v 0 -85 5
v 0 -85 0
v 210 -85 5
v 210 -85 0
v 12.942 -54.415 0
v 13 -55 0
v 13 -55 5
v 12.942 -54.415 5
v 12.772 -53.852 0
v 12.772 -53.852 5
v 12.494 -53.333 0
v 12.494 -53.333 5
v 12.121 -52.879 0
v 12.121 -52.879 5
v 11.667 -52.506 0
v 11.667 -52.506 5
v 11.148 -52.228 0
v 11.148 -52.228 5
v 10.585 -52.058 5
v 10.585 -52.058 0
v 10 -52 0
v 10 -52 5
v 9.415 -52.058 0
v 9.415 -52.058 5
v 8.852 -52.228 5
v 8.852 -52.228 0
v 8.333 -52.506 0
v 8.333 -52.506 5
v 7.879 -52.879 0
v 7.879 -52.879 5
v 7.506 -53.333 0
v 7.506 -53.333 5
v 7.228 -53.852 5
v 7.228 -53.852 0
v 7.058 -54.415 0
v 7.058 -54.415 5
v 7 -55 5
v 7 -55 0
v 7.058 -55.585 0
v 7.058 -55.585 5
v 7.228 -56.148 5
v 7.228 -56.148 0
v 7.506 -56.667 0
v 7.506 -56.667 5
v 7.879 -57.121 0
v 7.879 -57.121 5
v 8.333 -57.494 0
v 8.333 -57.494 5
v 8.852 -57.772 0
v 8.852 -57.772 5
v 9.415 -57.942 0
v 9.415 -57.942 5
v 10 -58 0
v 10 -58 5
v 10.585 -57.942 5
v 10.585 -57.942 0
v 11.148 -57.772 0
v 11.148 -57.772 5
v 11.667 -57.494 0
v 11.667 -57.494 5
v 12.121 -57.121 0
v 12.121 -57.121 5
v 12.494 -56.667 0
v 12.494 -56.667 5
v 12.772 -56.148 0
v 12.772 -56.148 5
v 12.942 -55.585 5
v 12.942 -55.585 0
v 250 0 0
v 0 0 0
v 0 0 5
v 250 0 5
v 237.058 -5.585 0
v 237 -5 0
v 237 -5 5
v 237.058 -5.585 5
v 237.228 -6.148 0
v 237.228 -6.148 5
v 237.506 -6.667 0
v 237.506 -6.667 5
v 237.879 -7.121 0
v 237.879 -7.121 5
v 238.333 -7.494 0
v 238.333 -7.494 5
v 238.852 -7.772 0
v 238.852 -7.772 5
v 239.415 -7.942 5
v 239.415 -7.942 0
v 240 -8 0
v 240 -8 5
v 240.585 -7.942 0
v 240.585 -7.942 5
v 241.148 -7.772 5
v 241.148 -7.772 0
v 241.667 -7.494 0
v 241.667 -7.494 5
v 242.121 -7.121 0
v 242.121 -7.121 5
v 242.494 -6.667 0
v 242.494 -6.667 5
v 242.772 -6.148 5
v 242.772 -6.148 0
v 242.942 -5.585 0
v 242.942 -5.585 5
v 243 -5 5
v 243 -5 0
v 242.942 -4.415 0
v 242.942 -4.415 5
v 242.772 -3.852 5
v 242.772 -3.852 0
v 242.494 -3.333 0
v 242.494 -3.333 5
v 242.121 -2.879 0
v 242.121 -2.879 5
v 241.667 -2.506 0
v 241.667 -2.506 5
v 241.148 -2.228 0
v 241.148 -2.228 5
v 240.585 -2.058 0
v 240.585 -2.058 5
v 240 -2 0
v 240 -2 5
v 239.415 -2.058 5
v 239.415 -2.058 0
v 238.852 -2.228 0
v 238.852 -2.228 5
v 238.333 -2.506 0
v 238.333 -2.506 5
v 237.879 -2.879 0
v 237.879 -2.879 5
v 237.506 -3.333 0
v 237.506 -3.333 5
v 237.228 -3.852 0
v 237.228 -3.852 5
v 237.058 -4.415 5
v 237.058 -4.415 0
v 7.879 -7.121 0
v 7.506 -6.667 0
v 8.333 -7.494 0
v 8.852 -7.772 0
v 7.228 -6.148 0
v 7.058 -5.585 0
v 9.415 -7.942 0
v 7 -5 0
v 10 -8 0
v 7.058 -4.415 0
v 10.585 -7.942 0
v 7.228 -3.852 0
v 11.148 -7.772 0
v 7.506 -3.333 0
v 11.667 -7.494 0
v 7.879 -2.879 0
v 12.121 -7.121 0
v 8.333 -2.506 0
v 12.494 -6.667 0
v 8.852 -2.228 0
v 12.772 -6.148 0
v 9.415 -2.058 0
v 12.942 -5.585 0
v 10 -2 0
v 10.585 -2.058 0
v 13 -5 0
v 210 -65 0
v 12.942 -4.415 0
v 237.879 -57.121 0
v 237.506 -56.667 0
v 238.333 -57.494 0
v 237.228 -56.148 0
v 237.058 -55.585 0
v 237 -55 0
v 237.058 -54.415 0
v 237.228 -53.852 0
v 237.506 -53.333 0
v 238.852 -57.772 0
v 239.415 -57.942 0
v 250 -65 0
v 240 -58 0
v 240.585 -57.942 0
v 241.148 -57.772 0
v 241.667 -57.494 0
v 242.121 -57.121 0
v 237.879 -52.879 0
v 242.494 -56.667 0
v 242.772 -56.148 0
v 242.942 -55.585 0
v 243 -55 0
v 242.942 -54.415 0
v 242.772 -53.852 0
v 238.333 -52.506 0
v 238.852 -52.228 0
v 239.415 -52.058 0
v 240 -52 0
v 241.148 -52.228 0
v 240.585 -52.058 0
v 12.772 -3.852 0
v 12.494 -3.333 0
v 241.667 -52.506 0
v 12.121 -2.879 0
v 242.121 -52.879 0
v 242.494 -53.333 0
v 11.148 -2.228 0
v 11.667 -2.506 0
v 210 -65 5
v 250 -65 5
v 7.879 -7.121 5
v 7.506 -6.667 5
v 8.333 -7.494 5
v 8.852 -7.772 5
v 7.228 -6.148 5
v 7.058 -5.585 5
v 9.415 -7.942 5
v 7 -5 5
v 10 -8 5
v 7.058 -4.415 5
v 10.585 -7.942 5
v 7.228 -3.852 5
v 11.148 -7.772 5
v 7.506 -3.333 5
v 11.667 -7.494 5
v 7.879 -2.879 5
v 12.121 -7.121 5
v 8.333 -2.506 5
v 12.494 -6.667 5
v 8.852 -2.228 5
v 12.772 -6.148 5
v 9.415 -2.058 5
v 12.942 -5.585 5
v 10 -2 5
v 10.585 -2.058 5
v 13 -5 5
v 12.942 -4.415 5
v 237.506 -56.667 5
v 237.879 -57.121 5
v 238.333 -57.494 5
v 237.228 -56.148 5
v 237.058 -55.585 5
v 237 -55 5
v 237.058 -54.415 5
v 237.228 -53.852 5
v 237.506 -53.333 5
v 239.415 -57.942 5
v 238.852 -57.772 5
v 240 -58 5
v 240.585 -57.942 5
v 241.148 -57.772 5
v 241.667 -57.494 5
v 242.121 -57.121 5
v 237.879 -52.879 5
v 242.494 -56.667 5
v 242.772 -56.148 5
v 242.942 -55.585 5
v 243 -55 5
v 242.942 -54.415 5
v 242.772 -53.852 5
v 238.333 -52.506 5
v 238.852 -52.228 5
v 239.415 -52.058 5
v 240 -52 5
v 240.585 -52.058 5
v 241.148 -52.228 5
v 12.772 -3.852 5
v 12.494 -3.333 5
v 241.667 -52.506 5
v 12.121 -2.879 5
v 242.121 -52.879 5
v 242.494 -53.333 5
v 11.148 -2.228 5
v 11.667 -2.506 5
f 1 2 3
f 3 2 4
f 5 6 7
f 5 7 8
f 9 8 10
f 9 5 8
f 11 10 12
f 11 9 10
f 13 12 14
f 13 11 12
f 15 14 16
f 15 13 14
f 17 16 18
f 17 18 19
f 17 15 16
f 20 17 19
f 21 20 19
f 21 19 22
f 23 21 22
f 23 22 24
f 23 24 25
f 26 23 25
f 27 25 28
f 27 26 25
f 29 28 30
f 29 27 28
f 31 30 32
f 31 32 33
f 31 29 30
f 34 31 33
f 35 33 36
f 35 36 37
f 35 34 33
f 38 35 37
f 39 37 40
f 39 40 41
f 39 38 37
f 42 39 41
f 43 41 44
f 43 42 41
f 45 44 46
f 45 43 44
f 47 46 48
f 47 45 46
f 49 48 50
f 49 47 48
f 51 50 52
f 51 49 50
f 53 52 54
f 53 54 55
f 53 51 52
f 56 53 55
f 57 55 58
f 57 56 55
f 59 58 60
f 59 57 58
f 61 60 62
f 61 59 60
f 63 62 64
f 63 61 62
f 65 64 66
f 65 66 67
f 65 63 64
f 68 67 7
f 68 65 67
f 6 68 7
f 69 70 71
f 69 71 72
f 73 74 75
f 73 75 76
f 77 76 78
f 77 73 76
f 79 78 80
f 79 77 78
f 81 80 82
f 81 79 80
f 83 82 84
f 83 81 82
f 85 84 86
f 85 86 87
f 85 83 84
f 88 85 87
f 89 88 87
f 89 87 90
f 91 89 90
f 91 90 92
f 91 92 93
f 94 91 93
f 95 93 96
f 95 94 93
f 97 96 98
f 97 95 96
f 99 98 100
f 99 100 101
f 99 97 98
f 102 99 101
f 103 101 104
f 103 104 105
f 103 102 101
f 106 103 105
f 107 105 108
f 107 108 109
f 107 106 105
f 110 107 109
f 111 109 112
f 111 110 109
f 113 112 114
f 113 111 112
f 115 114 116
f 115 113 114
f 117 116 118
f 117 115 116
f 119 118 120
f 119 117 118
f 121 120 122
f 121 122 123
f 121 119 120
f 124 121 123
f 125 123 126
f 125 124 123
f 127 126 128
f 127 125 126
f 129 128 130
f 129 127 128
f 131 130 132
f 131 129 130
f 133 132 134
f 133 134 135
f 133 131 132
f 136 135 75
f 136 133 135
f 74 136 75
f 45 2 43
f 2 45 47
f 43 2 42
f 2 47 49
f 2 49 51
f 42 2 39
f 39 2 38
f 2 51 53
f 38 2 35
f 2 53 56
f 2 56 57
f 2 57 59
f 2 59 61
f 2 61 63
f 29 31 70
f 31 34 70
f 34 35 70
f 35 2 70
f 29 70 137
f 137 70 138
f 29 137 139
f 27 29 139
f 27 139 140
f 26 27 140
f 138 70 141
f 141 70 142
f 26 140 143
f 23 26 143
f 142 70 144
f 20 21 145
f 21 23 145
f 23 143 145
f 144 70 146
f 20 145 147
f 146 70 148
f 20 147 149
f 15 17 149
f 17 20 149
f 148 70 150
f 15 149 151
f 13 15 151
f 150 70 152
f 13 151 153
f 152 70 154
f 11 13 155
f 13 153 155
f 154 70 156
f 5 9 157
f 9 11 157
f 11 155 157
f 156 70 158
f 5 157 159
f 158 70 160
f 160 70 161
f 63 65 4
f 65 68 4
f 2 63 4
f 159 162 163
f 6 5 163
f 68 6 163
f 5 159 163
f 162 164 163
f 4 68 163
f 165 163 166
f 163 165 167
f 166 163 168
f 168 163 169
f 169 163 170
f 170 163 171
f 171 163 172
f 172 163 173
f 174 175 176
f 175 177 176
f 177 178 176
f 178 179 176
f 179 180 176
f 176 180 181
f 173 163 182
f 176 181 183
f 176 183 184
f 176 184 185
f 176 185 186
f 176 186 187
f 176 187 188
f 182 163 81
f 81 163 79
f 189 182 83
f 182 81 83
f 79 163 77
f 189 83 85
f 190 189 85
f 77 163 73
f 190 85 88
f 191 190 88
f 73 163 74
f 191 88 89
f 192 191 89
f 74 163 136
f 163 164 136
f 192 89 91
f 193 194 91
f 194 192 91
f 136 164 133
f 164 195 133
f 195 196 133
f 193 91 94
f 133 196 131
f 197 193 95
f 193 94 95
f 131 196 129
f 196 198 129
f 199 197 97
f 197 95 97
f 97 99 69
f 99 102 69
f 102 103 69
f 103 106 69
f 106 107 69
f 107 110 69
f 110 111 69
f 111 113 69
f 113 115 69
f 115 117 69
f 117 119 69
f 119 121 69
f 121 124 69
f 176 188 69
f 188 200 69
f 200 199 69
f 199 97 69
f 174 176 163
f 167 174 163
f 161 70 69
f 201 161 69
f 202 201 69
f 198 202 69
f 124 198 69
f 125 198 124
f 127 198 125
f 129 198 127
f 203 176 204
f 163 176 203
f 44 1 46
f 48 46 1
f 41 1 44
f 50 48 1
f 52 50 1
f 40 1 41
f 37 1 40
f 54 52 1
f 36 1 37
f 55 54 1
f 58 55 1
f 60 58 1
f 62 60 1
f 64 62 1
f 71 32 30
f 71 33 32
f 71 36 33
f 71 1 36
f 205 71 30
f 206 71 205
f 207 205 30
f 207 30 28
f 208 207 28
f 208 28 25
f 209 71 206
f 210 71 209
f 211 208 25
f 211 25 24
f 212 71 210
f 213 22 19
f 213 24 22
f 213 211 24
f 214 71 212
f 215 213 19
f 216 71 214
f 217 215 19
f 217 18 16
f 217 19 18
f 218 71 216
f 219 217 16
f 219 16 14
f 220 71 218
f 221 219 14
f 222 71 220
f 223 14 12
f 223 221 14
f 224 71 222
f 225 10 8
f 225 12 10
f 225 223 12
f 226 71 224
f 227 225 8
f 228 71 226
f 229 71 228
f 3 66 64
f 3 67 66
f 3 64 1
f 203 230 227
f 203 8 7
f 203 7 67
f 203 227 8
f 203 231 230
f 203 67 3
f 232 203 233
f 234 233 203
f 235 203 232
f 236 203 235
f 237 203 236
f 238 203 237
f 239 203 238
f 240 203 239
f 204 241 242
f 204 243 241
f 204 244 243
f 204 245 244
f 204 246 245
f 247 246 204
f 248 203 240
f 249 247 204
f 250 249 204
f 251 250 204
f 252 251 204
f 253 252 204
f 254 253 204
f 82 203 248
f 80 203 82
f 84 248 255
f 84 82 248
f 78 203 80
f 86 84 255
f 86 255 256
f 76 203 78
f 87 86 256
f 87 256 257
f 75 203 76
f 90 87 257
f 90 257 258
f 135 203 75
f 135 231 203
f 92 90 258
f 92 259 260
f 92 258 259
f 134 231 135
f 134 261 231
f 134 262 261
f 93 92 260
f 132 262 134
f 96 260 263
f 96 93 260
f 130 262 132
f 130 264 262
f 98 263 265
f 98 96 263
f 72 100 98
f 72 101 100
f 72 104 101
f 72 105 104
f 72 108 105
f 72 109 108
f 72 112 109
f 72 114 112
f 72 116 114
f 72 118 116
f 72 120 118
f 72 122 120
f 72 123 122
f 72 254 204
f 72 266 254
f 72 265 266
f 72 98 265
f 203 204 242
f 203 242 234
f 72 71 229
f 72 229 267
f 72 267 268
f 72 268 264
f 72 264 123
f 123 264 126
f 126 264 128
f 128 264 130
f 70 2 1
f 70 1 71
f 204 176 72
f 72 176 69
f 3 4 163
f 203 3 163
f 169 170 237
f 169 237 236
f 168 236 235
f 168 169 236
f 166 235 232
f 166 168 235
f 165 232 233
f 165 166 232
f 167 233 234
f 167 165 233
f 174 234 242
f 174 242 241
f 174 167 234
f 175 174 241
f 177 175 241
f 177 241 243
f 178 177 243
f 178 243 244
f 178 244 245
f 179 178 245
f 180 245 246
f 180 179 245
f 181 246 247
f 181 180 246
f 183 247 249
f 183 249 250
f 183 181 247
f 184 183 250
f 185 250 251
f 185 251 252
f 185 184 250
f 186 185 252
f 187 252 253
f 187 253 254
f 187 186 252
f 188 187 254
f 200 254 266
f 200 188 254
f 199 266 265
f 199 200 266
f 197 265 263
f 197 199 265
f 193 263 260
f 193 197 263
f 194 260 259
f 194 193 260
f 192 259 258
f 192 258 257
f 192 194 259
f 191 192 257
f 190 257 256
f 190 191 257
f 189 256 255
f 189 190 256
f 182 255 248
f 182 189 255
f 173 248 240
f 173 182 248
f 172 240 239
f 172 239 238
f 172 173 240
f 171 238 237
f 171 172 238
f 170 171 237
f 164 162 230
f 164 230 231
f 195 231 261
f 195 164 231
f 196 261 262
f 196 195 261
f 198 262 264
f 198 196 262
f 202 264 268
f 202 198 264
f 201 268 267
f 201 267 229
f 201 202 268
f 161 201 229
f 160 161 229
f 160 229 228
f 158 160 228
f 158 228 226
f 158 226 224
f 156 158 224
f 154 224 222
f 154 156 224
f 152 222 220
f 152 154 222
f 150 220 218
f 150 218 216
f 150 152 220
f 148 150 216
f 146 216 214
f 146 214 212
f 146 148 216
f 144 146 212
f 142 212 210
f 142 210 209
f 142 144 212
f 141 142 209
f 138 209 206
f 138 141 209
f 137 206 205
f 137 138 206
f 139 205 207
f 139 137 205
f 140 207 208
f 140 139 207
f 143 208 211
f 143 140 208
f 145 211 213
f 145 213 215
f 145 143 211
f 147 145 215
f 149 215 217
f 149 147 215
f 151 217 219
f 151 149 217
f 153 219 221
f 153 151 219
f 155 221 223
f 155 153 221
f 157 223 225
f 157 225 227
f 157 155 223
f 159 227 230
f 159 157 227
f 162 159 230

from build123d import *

# Parameters (mm, degrees)
ESQUISSE1_W             = 250
ESQUISSE1_H             = 85
ESQUISSE1_R             = 3
BOSS_EXTRU_1_DEPTH      = 5
ESQUISSE2_W             = 40
ESQUISSE2_H             = 20
ENL_V_MAT_EXTRU_1_DEPTH = 10


with BuildPart() as part:
    # Esquisse1 → Boss.-Extru.1 (new body)
    with BuildSketch(Plane.XY):
        with Locations((125, -42.5)):
            Rectangle(ESQUISSE1_W, ESQUISSE1_H)
        with Locations((10, -5)):
            Circle(ESQUISSE1_R, mode=Mode.SUBTRACT)
        with Locations((10, -55)):
            Circle(ESQUISSE1_R, mode=Mode.SUBTRACT)
        with Locations(Location((240, -55, 0), (0, 0, 180))):
            Circle(ESQUISSE1_R, mode=Mode.SUBTRACT)
        with Locations(Location((240, -5, 0), (0, 0, 180))):
            Circle(ESQUISSE1_R, mode=Mode.SUBTRACT)
    extrude(amount=BOSS_EXTRU_1_DEPTH)

    # Esquisse2 → Enlèv. mat.-Extru.1 (cut)
    with BuildSketch(Plane(origin=(0, 0, 0), x_dir=(-1, 0, 0), z_dir=(0, 0, -1))):
        with Locations((-230, -75)):
            Rectangle(ESQUISSE2_W, ESQUISSE2_H)
    extrude(amount=-ENL_V_MAT_EXTRU_1_DEPTH, mode=Mode.SUBTRACT)


solid = part.part
